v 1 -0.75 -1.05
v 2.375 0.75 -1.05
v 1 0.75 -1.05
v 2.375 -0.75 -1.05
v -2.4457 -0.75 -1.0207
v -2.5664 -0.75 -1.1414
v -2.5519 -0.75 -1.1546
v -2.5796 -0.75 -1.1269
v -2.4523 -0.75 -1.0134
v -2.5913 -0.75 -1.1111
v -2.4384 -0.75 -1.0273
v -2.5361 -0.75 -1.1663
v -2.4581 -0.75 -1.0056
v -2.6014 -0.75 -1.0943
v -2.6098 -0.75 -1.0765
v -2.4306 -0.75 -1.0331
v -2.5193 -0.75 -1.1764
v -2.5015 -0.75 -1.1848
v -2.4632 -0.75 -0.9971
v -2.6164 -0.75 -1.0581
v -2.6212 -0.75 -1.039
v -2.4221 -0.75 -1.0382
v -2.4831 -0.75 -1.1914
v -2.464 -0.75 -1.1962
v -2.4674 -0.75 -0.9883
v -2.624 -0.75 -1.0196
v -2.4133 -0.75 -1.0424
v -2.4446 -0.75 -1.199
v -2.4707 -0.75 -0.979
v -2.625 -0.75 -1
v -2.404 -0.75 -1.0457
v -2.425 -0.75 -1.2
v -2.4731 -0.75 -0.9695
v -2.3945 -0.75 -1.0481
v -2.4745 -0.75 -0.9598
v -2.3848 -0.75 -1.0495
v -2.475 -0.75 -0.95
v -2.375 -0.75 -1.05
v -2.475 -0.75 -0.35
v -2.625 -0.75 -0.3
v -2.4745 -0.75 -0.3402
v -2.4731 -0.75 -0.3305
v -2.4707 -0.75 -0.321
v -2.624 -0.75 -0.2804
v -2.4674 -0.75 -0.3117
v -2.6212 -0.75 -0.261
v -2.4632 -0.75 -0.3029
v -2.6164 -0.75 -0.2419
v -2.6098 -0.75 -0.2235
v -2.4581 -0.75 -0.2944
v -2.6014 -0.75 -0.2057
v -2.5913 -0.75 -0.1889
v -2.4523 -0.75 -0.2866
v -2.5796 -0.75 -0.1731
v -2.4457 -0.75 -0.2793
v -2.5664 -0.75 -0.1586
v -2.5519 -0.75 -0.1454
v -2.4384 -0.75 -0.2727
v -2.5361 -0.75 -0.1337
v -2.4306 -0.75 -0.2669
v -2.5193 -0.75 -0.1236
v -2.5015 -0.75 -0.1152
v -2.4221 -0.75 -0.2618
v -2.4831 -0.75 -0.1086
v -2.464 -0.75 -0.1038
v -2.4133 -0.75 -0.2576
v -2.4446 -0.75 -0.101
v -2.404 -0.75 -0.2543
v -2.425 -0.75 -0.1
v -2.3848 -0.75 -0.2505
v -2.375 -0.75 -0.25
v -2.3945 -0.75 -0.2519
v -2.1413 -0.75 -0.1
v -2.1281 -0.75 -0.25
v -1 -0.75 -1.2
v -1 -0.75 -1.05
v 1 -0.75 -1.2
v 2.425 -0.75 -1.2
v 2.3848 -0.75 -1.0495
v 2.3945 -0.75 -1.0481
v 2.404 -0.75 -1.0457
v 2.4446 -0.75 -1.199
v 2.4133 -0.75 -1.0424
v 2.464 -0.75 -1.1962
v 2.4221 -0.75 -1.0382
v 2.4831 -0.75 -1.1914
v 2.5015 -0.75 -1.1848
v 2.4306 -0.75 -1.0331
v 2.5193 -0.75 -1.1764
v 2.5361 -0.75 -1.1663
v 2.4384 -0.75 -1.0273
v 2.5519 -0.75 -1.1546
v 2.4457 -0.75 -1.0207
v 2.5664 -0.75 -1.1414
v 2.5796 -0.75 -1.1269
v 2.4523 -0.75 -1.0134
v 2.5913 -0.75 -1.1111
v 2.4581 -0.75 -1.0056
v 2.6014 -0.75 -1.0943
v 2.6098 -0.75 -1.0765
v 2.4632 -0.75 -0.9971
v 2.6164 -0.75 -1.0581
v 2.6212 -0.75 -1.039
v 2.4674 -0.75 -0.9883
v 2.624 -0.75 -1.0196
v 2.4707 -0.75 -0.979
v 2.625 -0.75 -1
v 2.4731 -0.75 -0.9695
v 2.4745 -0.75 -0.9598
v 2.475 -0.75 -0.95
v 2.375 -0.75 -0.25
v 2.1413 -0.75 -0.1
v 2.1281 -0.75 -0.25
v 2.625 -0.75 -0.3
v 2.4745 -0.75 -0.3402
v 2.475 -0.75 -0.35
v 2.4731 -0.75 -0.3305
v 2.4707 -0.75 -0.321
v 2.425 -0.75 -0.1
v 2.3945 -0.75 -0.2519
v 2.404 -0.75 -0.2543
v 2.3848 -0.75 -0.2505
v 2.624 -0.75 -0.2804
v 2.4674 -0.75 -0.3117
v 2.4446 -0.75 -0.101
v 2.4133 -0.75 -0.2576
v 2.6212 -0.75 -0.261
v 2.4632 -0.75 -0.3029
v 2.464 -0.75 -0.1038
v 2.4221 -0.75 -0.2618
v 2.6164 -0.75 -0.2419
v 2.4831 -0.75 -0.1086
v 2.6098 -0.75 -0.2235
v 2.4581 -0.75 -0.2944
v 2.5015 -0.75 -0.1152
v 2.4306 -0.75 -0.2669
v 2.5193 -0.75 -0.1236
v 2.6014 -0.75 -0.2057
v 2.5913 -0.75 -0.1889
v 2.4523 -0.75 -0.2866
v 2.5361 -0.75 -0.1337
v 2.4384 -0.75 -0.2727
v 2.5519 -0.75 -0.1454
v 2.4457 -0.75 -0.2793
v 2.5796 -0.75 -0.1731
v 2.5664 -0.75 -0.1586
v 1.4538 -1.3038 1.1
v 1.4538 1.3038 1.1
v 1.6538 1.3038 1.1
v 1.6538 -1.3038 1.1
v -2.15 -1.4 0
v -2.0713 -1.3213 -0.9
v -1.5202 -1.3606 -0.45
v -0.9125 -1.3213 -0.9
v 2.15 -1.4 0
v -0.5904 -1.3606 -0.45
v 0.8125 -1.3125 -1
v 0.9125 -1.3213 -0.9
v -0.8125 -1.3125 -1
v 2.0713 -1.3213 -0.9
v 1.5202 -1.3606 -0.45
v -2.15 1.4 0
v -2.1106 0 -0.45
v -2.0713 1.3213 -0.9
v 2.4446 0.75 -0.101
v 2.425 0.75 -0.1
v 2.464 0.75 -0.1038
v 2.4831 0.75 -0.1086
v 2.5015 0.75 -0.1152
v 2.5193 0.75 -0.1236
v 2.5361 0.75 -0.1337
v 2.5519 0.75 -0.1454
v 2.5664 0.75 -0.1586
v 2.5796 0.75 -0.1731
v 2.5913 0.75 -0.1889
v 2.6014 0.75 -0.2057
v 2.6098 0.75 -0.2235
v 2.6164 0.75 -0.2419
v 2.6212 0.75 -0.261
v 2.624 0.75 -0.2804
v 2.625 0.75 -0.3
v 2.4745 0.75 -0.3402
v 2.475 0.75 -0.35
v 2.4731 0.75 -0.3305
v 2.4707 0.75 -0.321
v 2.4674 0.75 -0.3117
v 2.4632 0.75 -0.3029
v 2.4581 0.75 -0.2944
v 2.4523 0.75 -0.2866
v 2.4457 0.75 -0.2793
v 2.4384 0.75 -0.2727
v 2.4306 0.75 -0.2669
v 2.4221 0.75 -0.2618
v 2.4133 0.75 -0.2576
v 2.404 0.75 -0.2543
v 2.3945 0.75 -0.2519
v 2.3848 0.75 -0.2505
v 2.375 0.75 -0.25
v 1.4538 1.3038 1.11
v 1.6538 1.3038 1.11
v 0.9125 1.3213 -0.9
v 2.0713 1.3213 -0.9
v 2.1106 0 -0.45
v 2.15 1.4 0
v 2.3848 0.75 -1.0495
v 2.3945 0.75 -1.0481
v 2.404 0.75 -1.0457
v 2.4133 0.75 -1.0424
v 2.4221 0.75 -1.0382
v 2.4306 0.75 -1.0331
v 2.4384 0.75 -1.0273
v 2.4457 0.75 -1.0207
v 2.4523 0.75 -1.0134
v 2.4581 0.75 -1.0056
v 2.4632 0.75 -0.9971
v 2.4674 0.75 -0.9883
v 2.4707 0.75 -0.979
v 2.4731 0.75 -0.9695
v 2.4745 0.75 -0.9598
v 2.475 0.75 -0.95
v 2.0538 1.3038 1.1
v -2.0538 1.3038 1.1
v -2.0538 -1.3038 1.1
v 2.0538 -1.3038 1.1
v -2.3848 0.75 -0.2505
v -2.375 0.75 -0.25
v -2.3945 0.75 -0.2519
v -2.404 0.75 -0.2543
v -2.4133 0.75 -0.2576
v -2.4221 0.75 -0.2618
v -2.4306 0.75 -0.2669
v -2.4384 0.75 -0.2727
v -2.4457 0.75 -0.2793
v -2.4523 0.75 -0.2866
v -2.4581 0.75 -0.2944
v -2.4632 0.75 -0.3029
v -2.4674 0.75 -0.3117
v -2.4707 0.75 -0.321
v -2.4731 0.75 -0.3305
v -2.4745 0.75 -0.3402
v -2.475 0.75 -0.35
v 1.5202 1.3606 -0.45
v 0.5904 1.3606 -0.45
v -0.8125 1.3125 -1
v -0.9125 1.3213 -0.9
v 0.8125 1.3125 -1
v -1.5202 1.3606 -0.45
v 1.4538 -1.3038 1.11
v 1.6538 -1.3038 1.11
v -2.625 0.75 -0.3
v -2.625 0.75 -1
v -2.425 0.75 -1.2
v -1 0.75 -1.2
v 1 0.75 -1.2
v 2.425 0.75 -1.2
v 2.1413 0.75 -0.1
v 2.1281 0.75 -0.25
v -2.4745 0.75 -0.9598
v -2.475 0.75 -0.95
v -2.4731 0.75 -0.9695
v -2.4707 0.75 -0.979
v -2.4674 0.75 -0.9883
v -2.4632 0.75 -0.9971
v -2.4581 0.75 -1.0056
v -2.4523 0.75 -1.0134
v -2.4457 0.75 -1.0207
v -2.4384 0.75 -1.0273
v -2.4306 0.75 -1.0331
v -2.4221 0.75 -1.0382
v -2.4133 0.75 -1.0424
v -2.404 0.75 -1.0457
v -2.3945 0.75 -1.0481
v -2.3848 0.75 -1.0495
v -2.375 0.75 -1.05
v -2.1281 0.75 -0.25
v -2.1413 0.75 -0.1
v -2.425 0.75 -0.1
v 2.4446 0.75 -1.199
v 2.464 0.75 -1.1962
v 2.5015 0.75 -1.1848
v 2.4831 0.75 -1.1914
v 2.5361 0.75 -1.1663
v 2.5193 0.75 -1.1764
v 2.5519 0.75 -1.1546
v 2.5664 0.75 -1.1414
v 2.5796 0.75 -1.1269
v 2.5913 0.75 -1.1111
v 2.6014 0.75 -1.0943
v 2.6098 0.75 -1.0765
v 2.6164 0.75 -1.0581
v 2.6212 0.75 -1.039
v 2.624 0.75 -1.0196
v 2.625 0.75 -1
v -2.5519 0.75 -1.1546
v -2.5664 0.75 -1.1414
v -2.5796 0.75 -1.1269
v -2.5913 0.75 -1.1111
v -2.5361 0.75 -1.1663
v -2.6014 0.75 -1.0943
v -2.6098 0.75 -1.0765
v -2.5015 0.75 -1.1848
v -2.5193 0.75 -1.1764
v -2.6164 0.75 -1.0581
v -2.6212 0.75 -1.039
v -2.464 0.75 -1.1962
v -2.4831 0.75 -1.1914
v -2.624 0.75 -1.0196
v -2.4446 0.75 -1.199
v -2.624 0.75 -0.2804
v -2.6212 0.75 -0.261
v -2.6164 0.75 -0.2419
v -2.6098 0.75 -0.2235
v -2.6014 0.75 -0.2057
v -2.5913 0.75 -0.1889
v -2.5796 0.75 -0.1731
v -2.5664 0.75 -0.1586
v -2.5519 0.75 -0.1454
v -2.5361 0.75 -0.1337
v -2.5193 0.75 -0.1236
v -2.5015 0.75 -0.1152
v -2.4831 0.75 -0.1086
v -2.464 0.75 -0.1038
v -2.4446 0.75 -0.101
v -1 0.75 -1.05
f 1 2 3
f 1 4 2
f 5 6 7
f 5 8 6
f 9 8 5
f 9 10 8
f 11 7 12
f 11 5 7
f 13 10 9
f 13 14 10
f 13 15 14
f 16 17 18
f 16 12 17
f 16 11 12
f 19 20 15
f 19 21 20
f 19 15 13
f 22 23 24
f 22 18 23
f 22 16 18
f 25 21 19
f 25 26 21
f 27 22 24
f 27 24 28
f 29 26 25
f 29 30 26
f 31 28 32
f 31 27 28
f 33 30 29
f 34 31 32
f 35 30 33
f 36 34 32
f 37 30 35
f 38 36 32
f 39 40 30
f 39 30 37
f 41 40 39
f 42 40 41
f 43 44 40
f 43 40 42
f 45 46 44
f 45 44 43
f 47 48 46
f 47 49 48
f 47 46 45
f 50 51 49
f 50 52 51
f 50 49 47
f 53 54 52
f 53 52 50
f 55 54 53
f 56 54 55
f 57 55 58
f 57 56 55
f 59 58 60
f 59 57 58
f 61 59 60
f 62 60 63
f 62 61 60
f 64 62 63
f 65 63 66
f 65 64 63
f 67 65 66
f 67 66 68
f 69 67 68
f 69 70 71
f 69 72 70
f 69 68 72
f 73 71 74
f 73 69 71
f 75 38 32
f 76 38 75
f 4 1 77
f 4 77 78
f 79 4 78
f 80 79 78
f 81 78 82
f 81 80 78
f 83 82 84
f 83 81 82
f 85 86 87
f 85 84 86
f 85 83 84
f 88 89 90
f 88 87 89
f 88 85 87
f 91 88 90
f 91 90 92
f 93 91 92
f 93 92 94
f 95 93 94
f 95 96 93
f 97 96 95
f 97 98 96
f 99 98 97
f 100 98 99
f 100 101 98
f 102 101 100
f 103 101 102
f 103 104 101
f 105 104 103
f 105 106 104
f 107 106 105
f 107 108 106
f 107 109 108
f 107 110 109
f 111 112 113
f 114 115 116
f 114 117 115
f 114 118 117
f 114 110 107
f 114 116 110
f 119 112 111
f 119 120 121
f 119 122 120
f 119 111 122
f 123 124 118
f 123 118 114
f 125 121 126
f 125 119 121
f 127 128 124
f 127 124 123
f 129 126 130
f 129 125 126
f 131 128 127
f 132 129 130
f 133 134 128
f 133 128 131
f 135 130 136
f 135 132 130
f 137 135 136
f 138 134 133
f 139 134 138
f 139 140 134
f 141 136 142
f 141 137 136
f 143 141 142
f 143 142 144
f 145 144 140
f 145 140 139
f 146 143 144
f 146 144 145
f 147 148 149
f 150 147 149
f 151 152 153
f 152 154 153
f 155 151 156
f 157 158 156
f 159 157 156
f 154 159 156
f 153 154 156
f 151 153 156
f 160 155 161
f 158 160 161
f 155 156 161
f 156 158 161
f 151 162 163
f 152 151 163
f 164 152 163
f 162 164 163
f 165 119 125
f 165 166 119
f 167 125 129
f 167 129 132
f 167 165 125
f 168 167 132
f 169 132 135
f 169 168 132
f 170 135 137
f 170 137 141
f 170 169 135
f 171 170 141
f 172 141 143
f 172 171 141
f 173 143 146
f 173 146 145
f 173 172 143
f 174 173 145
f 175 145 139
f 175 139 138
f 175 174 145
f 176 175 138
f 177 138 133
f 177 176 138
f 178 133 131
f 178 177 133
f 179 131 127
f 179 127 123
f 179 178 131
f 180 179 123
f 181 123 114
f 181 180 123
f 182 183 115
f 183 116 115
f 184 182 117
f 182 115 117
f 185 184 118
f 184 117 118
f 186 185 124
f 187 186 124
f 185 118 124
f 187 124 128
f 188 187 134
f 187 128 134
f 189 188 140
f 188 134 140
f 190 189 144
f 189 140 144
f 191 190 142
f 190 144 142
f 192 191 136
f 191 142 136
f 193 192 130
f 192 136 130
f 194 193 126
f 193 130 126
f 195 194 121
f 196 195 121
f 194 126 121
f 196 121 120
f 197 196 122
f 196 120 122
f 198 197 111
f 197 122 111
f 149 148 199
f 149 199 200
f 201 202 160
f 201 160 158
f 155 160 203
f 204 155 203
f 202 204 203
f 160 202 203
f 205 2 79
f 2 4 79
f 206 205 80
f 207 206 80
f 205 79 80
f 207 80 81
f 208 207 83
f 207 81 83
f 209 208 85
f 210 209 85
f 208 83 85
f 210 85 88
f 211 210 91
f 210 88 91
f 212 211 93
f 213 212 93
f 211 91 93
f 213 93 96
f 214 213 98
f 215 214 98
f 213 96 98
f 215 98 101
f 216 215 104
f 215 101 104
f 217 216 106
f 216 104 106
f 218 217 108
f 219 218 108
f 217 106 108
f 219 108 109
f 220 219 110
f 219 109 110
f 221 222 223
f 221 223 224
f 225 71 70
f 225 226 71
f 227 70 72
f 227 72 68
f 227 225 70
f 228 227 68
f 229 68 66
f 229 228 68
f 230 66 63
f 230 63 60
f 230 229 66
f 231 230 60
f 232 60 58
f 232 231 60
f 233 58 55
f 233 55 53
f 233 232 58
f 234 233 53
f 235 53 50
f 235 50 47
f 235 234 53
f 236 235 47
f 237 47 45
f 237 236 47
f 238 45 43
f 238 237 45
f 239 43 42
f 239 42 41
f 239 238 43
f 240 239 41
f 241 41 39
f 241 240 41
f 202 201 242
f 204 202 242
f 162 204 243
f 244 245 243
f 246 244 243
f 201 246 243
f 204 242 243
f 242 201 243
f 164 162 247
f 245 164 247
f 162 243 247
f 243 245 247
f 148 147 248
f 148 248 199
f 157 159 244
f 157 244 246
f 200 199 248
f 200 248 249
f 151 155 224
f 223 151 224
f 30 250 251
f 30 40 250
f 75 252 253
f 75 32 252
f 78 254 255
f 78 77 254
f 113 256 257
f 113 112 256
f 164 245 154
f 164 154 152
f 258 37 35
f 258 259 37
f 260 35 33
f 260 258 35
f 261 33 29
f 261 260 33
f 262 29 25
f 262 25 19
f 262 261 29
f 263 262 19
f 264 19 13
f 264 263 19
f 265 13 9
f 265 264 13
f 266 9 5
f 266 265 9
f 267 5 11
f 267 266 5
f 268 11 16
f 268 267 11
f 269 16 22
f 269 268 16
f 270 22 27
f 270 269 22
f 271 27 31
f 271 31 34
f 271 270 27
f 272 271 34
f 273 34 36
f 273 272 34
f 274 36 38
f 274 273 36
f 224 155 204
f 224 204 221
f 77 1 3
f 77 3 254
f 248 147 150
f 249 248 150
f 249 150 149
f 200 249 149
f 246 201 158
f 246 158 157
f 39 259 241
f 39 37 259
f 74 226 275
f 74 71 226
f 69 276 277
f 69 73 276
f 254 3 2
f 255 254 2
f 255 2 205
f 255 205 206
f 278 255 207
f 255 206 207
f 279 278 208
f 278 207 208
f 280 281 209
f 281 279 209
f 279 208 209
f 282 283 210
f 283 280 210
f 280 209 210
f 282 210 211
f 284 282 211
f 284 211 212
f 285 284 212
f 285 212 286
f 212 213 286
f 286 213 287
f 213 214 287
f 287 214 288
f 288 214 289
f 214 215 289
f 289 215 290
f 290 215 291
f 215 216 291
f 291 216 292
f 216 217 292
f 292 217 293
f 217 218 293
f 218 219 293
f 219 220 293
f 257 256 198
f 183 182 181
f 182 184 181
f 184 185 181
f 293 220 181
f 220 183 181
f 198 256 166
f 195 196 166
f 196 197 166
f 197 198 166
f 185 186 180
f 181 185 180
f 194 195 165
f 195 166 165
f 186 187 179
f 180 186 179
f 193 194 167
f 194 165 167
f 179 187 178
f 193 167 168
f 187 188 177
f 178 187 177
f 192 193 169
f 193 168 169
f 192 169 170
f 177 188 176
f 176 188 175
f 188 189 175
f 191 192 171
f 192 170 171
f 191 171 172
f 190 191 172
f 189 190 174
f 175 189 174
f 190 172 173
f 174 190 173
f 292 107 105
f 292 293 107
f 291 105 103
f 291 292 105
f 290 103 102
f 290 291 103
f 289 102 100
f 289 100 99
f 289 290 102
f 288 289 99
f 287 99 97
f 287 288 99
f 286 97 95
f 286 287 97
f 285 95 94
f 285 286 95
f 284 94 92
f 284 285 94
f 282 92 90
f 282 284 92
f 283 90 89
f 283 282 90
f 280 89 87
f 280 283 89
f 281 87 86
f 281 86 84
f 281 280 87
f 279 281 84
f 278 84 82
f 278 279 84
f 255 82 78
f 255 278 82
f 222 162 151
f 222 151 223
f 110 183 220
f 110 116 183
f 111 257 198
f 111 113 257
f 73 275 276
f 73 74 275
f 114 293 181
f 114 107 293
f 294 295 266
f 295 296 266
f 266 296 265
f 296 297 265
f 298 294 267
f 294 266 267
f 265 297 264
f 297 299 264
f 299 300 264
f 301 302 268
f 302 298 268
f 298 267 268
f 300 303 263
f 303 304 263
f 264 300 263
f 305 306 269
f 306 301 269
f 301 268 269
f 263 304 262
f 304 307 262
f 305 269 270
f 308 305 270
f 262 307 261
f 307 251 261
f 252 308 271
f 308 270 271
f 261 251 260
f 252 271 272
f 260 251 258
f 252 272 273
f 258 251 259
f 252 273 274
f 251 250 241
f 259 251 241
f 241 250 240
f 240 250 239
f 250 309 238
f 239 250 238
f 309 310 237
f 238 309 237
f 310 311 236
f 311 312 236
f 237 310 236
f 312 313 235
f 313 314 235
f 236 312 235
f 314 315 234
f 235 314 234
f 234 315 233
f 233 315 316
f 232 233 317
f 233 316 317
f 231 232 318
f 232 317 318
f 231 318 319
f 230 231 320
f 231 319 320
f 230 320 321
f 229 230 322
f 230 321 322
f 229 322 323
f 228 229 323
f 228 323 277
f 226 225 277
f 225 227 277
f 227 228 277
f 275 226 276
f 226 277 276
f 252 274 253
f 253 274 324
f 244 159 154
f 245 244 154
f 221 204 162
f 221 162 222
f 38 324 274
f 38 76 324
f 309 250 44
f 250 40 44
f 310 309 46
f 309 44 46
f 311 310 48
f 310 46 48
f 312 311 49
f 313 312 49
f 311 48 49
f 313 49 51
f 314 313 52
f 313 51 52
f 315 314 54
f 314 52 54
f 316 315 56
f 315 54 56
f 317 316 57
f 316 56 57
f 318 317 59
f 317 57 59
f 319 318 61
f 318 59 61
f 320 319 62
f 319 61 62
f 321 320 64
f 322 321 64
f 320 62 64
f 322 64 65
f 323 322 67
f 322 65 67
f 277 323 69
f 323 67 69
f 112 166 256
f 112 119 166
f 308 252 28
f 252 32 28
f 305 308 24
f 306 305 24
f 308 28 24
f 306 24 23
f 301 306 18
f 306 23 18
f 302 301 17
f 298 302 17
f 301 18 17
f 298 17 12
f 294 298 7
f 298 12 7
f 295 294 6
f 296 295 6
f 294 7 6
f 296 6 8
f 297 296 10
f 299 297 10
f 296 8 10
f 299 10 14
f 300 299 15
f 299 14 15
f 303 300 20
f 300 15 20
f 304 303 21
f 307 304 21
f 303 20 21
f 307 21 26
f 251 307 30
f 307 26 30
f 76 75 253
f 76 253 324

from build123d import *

# Parameters (mm, degrees)
F0_W      = 4.3
F0_H      = 2.8
F1_DEPTH  = 1.1
F1_TAPER  = 5
F2_DEPTH  = 1
F2_TAPER  = 5
F4_DEPTH  = 0.75
F5_R      = 0.2
F5_2_R    = 0.2
F6_R      = 0.1
F6_2_R    = 0.1
F8_DEPTH  = 12.5
F9_W      = 0.2
F9_H      = 2.6075249402
F10_DEPTH = 0.01


with BuildPart() as f1:
    # F0 (on Top) → F1 (new body)
    with BuildSketch(Plane.XY):
        Rectangle(F0_W, F0_H)
    extrude(amount=F1_DEPTH, taper=F1_TAPER)

    # F0 (on Top) → F2 (join)
    with BuildSketch(Plane.XY):
        Rectangle(F0_W, F0_H)
    extrude(amount=-F2_DEPTH, taper=F2_TAPER)

    # F7 (on Front) → F8 (cut, symmetric)
    with BuildSketch(Plane.XZ):
        Polygon((2.0625113365, -1), (2.0712602028, -0.9), (0.9125113365, -0.9), (0.8125113365, -1), align=None)
        Polygon((-2.0712602028, -0.9), (-2.0625113365, -1), (-0.8125113365, -1), (-0.9125113365, -0.9), align=None)
    extrude(amount=F8_DEPTH, both=True, mode=Mode.SUBTRACT)


with BuildPart() as f4:
    # F3 (on Front) → F4 (new body, symmetric)
    with BuildSketch(Plane.XZ):
        Polygon((-2.1281278341, -0.25), (-2.1412511336, -0.1), (-2.625, -0.1), (-2.625, -1.2), (-1, -1.2), (-1, -1.05), (-2.475, -1.05), (-2.475, -0.25), align=None)
    extrude(amount=F4_DEPTH, both=True)

    # F5
    f5_edges = [f4.edges().sort_by_distance(p)[0] for p in [
        (-2.625, 0, -0.1),
        (-2.625, 0, -1.2),
    ]]
    fillet(f5_edges, radius=F5_R)

    # F6
    f6_edges = [f4.edges().sort_by_distance(p)[0] for p in [
        (-2.475, 0, -0.25),
        (-2.475, 0, -1.05),
    ]]
    fillet(f6_edges, radius=F6_R)


with BuildPart() as f4b:
    # F3 (on Front) → F4, piece 2 (new body, symmetric)
    with BuildSketch(Plane.XZ):
        Polygon((2.1412511336, -0.1), (2.1281278341, -0.25), (2.475, -0.25), (2.475, -1.05), (1, -1.05), (1, -1.2), (2.625, -1.2), (2.625, -0.1), align=None)
    extrude(amount=F4_DEPTH, both=True)

    # F5#2
    f5_2_edges = [f4b.edges().sort_by_distance(p)[0] for p in [
        (2.625, 0, -0.1),
        (2.625, 0, -1.2),
    ]]
    fillet(f5_2_edges, radius=F5_2_R)

    # F6#2
    f6_2_edges = [f4b.edges().sort_by_distance(p)[0] for p in [
        (2.475, 0, -1.05),
        (2.475, 0, -0.25),
    ]]
    fillet(f6_2_edges, radius=F6_2_R)


with BuildPart() as f10:
    # F9 (on face) → F10 (new body)
    with BuildSketch(Plane.XY.offset(1.1)):
        with Locations((1.5537624701, 0)):
            Rectangle(F9_W, F9_H)
    extrude(amount=F10_DEPTH)


solid = Compound([f1.part, f4.part, f4b.part, f10.part])
